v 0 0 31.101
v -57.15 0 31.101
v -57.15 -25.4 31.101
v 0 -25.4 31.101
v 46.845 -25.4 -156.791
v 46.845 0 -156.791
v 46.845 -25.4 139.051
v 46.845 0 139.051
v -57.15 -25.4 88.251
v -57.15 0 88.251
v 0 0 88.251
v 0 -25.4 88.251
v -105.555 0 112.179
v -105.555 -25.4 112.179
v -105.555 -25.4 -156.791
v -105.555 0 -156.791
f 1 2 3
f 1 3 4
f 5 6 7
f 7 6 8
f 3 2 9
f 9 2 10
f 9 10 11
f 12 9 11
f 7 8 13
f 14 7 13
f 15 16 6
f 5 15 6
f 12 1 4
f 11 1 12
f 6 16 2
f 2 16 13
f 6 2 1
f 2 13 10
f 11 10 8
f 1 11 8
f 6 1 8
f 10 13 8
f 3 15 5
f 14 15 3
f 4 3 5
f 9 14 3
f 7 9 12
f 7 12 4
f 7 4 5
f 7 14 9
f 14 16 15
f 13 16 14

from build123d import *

# Parameters (mm, degrees)
F0_W        = 152.4
F0_H        = 304.8
F1_DEPTH    = 25.4
F2_T1_DEPTH = 1081.4461668656
F3_W        = 57.15
F3_H        = 57.15
F4_DEPTH    = 25.4


# Not quite as in the source:
# - a fillet or chamfer that OpenCascade refuses, or shapes differently, is made with other operations: its cross-section is extruded or revolved along the edge and cut away or added


with BuildPart() as f1:
    # F0 (on Front) → F1 (new body)
    with BuildSketch(Plane.XZ):
        with Locations((-29.3548897063, -4.3910965323)):
            Rectangle(F0_W, F0_H)
    extrude(amount=F1_DEPTH)

    # F2: chamfer of 203.2 x 35.82964248 on 1 edges, made by hand

    # F2_s2 → F2_t1 (cut)
    with BuildSketch(Plane.XZ.offset(-528.0230834328)):
        Polygon((97.6451102937, 148.0089034677), (-105.5548897063, 112.1792609877), (-105.5548897063, 148.0089034677), align=None)
    extrude(amount=F2_T1_DEPTH, mode=Mode.SUBTRACT)

    # F3 (on face) → F4 (cut, through all)
    with BuildSketch(Plane.XZ):
        with Locations((-28.575, 59.6764928477)):
            Rectangle(F3_W, F3_H)
    extrude(amount=F4_DEPTH, mode=Mode.SUBTRACT)


solid = f1.part
